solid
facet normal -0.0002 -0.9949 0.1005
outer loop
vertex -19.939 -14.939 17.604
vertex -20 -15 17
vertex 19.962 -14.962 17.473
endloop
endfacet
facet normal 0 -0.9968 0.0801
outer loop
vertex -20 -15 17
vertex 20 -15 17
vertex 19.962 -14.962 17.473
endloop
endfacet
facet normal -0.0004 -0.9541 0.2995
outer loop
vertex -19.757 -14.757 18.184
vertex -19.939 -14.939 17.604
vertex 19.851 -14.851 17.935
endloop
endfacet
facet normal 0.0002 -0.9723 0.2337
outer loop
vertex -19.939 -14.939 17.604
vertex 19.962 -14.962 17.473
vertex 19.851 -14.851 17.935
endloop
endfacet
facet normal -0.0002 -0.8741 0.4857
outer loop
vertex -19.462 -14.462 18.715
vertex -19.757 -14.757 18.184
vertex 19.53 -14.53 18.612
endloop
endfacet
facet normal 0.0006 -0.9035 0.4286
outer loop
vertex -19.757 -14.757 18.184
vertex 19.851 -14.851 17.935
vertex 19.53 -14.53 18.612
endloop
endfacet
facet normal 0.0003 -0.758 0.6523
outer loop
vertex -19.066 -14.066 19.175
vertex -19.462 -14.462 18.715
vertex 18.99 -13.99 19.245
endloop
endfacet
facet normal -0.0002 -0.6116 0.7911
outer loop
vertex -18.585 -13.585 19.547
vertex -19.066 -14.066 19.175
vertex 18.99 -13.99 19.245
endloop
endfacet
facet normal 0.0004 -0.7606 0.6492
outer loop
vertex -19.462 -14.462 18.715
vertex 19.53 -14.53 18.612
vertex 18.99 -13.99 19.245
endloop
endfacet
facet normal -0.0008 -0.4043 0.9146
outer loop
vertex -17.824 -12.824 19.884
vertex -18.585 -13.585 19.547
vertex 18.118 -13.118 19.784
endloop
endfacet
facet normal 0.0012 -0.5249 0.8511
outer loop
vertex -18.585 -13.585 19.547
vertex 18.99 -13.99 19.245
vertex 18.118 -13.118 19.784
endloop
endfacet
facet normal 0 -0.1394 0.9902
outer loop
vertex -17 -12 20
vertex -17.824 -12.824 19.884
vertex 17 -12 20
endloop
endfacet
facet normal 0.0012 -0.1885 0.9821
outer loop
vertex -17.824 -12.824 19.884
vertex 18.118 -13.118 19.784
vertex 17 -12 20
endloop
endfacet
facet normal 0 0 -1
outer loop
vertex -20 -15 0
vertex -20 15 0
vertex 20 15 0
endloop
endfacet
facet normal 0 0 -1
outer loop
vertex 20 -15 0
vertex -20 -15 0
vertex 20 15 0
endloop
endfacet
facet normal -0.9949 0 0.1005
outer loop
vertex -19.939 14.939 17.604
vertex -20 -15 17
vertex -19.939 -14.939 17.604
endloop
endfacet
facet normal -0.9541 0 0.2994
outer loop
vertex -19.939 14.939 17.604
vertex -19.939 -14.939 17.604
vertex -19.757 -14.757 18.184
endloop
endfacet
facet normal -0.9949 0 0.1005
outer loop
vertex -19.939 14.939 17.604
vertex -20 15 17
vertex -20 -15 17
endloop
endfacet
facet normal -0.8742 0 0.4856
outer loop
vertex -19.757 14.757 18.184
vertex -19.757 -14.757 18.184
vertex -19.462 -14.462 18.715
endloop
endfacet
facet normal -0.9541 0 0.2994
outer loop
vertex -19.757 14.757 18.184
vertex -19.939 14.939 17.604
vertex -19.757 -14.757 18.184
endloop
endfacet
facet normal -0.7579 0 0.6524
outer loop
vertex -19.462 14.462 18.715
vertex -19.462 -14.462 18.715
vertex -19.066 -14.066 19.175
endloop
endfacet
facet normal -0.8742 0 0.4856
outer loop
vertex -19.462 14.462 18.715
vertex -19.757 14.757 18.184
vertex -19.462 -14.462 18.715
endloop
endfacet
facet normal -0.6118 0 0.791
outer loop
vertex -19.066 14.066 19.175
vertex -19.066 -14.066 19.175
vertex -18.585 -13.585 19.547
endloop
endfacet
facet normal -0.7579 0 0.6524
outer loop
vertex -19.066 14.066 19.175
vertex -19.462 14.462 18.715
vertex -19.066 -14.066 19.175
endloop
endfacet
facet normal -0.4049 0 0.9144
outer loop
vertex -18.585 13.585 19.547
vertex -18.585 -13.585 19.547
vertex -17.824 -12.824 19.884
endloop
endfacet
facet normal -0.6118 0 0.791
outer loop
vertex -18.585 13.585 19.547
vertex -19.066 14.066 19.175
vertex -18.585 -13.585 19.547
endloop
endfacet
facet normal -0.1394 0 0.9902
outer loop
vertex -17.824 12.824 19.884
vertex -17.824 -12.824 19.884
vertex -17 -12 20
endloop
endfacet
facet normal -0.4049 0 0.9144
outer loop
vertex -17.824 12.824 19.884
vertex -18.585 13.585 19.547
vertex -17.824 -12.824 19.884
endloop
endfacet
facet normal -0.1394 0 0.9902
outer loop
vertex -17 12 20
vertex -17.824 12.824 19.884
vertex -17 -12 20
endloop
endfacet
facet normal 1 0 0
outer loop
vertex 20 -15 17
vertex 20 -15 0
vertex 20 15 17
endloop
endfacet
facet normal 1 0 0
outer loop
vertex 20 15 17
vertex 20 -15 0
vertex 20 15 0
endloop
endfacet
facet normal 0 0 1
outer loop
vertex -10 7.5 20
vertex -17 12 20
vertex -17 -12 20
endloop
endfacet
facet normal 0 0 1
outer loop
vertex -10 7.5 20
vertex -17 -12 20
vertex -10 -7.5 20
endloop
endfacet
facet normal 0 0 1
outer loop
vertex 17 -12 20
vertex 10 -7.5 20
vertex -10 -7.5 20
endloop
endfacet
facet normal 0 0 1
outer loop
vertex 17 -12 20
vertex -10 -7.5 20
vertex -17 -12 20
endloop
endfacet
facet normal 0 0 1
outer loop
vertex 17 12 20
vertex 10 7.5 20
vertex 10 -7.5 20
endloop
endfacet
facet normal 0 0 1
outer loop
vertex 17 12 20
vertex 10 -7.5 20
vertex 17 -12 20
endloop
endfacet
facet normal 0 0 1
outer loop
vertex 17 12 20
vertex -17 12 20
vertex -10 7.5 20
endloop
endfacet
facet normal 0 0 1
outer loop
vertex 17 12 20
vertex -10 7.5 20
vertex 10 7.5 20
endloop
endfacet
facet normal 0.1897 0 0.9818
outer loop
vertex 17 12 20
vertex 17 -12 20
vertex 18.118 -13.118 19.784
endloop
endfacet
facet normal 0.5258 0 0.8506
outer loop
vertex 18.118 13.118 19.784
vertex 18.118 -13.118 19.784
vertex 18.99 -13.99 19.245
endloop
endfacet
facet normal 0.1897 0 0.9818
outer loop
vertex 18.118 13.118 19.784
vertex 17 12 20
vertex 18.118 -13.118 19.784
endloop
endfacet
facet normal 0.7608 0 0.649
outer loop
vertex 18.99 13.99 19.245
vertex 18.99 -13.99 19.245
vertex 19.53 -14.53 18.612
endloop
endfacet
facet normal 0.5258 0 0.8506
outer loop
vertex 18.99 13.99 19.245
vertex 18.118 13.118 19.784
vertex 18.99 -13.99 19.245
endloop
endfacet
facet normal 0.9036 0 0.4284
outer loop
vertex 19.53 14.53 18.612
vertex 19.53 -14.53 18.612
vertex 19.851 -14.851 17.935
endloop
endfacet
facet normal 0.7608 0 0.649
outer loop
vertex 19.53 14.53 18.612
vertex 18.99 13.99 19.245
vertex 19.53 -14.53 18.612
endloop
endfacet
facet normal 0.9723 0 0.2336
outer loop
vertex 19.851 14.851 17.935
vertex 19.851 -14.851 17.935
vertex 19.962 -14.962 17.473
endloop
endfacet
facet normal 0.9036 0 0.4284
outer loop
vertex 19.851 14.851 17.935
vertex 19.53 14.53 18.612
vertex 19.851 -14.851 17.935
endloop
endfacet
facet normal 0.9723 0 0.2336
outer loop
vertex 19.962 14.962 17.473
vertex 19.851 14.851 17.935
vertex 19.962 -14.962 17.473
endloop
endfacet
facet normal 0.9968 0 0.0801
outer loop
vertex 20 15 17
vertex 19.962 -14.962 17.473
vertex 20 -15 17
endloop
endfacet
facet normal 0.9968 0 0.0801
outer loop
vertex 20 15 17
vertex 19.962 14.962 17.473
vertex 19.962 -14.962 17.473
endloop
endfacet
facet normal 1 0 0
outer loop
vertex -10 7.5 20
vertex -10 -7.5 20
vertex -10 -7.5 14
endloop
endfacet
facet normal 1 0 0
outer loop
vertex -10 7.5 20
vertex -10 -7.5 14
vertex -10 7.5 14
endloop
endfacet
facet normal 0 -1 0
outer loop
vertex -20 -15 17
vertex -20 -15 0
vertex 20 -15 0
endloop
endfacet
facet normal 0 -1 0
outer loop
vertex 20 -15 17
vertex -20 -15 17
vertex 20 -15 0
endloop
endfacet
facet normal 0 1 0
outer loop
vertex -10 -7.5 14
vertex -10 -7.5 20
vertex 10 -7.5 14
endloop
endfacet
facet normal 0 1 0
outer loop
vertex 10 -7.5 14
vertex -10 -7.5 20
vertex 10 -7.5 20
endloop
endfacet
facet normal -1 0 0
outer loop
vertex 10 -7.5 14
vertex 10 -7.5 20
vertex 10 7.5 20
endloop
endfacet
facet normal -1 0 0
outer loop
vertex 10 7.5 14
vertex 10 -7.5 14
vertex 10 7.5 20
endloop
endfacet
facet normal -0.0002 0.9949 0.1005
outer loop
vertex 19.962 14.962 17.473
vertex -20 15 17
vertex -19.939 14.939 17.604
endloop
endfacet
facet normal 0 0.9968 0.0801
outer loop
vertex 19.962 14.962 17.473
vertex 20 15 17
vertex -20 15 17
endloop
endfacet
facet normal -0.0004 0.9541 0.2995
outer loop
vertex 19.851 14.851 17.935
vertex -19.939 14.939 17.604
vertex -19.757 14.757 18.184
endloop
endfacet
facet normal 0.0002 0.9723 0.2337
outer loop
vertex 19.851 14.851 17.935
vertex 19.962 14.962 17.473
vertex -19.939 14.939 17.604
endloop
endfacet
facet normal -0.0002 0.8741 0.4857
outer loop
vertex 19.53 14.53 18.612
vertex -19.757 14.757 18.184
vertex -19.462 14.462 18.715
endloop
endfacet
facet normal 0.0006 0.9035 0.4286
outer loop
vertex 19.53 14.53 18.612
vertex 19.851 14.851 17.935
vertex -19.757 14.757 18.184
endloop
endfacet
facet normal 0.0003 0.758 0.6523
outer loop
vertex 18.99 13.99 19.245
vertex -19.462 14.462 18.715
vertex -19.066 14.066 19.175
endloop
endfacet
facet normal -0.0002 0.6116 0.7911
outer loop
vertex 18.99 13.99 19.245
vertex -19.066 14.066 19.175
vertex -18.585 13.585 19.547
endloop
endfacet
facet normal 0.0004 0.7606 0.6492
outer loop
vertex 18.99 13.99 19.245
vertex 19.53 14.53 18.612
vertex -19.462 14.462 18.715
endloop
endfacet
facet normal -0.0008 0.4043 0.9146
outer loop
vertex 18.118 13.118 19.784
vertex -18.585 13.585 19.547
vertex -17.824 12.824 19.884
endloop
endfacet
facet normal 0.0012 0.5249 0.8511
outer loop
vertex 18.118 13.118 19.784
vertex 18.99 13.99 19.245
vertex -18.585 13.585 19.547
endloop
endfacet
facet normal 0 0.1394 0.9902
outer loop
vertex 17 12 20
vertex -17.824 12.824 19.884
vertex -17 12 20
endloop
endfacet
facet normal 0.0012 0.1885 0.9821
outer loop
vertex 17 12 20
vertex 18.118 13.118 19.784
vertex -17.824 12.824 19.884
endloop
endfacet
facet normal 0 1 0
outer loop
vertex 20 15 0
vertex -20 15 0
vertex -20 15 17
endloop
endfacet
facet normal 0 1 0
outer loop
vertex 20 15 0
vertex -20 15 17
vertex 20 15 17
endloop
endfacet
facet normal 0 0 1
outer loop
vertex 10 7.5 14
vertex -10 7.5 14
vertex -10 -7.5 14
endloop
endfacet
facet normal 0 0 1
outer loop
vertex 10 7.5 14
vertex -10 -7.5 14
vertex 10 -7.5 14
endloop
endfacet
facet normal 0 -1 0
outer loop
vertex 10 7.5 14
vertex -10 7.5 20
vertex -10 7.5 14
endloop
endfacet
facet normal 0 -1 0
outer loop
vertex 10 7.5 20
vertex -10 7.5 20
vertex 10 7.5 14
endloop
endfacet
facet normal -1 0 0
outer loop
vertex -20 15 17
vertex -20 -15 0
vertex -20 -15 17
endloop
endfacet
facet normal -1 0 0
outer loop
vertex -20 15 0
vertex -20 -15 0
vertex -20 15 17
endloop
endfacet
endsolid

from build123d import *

# Parameters (mm, degrees)
SKETCH_1_W      = 40
SKETCH_1_H      = 30
M0_BOSS_DEPTH   = 20
SKETCH_2_W      = 20
SKETCH_2_H      = 15
M0_POCKET_DEPTH = 6
M0_TOPR3_R      = 3


with BuildPart() as part:
    # ｽｹｯﾁ1 → M0_Boss (new body)
    with BuildSketch(Plane.XY):
        Rectangle(SKETCH_1_W, SKETCH_1_H)
    extrude(amount=M0_BOSS_DEPTH)

    # ｽｹｯﾁ2 → M0_Pocket (cut)
    with BuildSketch(Plane.XY.offset(20)):
        Rectangle(SKETCH_2_W, SKETCH_2_H)
    extrude(amount=-M0_POCKET_DEPTH, mode=Mode.SUBTRACT)

    # M0_TopR3
    m0_topr3_edges = [part.edges().sort_by_distance(p)[0] for p in [
        (20, 0, 20),
        (0, 15, 20),
        (-20, 0, 20),
        (0, -15, 20),
    ]]
    fillet(m0_topr3_edges, radius=M0_TOPR3_R)


solid = part.part
